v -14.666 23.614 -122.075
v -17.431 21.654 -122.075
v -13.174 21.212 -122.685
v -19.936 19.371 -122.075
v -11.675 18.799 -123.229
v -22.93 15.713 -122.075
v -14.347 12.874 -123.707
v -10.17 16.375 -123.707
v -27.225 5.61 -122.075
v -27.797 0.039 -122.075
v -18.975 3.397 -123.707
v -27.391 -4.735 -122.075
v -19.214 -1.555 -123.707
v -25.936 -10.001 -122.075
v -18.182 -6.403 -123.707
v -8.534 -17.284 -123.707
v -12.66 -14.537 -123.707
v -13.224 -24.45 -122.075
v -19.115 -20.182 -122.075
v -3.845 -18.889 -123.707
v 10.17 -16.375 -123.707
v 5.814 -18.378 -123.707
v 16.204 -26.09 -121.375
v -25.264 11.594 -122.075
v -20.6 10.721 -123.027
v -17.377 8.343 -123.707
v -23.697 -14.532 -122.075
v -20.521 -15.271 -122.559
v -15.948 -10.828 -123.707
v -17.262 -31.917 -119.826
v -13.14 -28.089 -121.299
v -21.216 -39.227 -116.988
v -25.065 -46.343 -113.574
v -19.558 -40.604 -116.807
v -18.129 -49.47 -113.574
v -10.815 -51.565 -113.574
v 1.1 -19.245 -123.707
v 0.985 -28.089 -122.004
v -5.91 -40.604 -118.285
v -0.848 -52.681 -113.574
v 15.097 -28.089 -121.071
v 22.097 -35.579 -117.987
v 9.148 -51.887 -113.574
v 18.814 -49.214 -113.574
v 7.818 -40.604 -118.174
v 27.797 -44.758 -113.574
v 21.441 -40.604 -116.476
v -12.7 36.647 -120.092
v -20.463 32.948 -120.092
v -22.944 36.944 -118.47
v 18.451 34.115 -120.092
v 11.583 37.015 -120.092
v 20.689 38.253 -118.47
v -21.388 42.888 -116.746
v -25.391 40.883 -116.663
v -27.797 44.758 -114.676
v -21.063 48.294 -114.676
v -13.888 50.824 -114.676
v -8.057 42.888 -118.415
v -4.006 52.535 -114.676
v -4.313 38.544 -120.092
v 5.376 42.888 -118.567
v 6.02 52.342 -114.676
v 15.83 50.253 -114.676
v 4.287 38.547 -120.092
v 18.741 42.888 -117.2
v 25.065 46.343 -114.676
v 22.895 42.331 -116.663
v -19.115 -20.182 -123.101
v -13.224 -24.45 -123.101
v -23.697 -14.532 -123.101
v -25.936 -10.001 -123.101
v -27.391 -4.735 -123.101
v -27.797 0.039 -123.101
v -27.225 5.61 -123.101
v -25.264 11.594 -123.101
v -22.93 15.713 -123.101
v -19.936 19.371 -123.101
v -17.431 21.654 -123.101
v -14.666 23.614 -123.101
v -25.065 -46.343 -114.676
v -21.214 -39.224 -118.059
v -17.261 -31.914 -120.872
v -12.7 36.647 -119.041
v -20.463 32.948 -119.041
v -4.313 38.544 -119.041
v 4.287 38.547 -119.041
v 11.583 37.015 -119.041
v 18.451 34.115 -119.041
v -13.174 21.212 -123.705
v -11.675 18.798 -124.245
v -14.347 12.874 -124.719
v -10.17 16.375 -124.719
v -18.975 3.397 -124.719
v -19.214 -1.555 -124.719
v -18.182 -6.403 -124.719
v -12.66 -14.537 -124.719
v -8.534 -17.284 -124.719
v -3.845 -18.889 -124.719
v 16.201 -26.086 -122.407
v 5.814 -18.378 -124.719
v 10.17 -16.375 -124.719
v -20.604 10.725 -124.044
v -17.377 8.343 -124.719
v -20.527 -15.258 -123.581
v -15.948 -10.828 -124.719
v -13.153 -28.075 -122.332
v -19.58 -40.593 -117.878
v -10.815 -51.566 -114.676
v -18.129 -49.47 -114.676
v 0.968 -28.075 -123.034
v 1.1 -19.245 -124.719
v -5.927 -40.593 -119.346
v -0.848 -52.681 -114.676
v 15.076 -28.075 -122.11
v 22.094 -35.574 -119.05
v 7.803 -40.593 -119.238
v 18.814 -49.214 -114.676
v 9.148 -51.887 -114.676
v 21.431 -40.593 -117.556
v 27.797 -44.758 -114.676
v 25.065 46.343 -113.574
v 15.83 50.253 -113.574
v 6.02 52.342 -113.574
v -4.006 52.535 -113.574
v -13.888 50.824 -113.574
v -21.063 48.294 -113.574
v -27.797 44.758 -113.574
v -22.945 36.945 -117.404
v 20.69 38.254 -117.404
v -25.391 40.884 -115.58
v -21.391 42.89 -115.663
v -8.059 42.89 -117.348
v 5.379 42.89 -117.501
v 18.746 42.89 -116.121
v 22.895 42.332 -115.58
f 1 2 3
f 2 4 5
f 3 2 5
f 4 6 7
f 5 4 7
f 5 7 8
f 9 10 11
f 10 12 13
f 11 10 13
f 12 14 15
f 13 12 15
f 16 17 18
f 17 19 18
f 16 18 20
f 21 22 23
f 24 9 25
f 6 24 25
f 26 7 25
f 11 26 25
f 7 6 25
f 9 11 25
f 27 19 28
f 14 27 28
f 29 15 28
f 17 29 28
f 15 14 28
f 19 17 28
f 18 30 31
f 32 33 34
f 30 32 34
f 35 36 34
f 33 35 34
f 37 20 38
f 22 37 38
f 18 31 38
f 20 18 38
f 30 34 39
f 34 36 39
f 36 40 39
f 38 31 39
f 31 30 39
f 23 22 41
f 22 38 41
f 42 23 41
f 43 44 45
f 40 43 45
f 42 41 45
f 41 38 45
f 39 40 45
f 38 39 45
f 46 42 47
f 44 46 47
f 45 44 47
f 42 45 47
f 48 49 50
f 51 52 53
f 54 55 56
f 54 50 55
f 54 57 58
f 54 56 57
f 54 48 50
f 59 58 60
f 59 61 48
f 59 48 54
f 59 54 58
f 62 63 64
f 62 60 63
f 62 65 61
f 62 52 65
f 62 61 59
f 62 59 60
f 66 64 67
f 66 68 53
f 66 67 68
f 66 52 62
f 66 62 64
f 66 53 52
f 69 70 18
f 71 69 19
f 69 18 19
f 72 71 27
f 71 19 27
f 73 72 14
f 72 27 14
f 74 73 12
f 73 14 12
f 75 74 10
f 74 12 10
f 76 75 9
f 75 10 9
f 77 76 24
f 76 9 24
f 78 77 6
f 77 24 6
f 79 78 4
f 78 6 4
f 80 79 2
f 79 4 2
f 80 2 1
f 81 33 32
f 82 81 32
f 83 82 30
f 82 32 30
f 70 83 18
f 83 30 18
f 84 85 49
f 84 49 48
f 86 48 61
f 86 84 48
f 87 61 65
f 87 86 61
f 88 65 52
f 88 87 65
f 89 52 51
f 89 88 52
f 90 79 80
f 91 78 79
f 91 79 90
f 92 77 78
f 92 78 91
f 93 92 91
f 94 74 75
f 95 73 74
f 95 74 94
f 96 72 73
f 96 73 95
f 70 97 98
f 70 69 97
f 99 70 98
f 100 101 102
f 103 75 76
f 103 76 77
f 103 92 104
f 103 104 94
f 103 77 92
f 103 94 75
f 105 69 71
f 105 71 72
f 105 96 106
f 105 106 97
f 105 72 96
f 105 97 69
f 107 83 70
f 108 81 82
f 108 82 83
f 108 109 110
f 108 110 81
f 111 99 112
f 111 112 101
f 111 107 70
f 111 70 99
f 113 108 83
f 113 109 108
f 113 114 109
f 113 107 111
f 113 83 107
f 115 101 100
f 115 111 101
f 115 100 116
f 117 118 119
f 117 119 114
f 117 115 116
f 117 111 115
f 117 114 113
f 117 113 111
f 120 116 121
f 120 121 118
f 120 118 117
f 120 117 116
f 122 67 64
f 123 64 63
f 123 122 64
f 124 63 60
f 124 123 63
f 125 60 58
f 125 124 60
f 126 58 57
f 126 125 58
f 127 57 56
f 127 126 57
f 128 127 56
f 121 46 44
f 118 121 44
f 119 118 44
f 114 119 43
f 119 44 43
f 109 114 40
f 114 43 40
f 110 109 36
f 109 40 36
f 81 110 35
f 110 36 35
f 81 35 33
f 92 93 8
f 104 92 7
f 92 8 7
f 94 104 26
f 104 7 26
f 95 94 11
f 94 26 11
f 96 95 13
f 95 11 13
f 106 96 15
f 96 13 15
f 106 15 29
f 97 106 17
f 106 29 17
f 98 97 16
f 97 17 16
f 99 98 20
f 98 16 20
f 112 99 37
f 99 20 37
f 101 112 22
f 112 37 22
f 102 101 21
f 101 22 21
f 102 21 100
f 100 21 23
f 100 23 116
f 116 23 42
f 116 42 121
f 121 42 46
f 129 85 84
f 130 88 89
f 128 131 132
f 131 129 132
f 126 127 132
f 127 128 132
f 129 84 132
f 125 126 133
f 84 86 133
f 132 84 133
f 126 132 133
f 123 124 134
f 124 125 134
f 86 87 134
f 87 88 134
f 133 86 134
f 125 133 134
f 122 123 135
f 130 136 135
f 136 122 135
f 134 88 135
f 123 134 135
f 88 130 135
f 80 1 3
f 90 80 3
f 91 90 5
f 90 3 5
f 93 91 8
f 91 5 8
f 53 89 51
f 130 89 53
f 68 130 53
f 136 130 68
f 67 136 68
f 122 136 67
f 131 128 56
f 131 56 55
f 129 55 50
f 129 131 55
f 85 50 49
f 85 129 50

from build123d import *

# Parameters (mm, degrees)
REVOLVE_1_ANGLE     = 180
SHELL_1_T           = 1
SKETCH_2_OUTSIDE_W  = 330.12
SKETCH_2_OUTSIDE_H  = 330.12
CUT_EXTRUDE_1_DEPTH = 181


with BuildPart() as part:
    # 草图3 → 旋转1 (revolve)
    with BuildSketch(Plane.XY):
        with BuildLine():
            Line((0, -125.2), (0, 125.2))
            ThreePointArc((0, 125.2), (-125.2, 0), (0, -125.2))
        make_face()
    revolve(axis=Axis((0, 183.556728616, 0), (0, -1, 0)), revolution_arc=REVOLVE_1_ANGLE)

    # 抽壳1
    shell_1_openings = [part.faces().sort_by_distance(p)[0] for p in [
        (0, 0, 0),
    ]]
    offset(amount=SHELL_1_T, openings=shell_1_openings)

    # 草图2 outside → 切除-拉伸1 (cut)
    with BuildSketch(Plane.XY):
        Rectangle(SKETCH_2_OUTSIDE_W, SKETCH_2_OUTSIDE_H)
        with BuildLine():
            Line((-27.797446952, 44.75785495), (-20.46258832, 32.947686222))
            ThreePointArc((-20.46258832, 32.947686222), (-1.162793695, 38.767453604), (18.451109461, 34.114866375))
            Line((18.451109461, 34.114866375), (25.064949186, 46.34341333))
            ThreePointArc((25.064949186, 46.34341333), (-1.579599587, 52.663730422), (-27.797446952, 44.75785495))
        make_face(mode=Mode.SUBTRACT)
        with BuildLine():
            Line((-14.665704624, 23.613876534), (-10.170028494, 16.375196649))
            ThreePointArc((-10.170028494, 16.375196649), (-16.375196649, -10.170028494), (10.170028494, -16.375196649))
            Line((10.170028494, -16.375196649), (27.797446952, -44.75785495))
            ThreePointArc((27.797446952, -44.75785495), (1.579599587, -52.663730422), (-25.064949186, -46.34341333))
            Line((-25.064949186, -46.34341333), (-13.224061253, -24.450404108))
            ThreePointArc((-13.224061253, -24.450404108), (-27.784951477, -0.833383764), (-14.665704624, 23.613876534))
        make_face(mode=Mode.SUBTRACT)
    extrude(amount=-CUT_EXTRUDE_1_DEPTH, mode=Mode.SUBTRACT)


with BuildPart() as cut_extrude_1_piece_1:
    # of the separate pieces the step leaves, piece 1, a body of its own (cut_extrude_1_pieces)
    add(part.part.solids().sort_by_distance((-13.224061253, -24.450404108, -122.075148752))[0])


with BuildPart() as cut_extrude_1_piece_2:
    # of the separate pieces the step leaves, piece 2, a body of its own (cut_extrude_1_pieces)
    add(part.part.solids().sort_by_distance((-20.46258832, 32.947686222, -119.041053641))[0])


solid = Compound([cut_extrude_1_piece_1.part, cut_extrude_1_piece_2.part])
